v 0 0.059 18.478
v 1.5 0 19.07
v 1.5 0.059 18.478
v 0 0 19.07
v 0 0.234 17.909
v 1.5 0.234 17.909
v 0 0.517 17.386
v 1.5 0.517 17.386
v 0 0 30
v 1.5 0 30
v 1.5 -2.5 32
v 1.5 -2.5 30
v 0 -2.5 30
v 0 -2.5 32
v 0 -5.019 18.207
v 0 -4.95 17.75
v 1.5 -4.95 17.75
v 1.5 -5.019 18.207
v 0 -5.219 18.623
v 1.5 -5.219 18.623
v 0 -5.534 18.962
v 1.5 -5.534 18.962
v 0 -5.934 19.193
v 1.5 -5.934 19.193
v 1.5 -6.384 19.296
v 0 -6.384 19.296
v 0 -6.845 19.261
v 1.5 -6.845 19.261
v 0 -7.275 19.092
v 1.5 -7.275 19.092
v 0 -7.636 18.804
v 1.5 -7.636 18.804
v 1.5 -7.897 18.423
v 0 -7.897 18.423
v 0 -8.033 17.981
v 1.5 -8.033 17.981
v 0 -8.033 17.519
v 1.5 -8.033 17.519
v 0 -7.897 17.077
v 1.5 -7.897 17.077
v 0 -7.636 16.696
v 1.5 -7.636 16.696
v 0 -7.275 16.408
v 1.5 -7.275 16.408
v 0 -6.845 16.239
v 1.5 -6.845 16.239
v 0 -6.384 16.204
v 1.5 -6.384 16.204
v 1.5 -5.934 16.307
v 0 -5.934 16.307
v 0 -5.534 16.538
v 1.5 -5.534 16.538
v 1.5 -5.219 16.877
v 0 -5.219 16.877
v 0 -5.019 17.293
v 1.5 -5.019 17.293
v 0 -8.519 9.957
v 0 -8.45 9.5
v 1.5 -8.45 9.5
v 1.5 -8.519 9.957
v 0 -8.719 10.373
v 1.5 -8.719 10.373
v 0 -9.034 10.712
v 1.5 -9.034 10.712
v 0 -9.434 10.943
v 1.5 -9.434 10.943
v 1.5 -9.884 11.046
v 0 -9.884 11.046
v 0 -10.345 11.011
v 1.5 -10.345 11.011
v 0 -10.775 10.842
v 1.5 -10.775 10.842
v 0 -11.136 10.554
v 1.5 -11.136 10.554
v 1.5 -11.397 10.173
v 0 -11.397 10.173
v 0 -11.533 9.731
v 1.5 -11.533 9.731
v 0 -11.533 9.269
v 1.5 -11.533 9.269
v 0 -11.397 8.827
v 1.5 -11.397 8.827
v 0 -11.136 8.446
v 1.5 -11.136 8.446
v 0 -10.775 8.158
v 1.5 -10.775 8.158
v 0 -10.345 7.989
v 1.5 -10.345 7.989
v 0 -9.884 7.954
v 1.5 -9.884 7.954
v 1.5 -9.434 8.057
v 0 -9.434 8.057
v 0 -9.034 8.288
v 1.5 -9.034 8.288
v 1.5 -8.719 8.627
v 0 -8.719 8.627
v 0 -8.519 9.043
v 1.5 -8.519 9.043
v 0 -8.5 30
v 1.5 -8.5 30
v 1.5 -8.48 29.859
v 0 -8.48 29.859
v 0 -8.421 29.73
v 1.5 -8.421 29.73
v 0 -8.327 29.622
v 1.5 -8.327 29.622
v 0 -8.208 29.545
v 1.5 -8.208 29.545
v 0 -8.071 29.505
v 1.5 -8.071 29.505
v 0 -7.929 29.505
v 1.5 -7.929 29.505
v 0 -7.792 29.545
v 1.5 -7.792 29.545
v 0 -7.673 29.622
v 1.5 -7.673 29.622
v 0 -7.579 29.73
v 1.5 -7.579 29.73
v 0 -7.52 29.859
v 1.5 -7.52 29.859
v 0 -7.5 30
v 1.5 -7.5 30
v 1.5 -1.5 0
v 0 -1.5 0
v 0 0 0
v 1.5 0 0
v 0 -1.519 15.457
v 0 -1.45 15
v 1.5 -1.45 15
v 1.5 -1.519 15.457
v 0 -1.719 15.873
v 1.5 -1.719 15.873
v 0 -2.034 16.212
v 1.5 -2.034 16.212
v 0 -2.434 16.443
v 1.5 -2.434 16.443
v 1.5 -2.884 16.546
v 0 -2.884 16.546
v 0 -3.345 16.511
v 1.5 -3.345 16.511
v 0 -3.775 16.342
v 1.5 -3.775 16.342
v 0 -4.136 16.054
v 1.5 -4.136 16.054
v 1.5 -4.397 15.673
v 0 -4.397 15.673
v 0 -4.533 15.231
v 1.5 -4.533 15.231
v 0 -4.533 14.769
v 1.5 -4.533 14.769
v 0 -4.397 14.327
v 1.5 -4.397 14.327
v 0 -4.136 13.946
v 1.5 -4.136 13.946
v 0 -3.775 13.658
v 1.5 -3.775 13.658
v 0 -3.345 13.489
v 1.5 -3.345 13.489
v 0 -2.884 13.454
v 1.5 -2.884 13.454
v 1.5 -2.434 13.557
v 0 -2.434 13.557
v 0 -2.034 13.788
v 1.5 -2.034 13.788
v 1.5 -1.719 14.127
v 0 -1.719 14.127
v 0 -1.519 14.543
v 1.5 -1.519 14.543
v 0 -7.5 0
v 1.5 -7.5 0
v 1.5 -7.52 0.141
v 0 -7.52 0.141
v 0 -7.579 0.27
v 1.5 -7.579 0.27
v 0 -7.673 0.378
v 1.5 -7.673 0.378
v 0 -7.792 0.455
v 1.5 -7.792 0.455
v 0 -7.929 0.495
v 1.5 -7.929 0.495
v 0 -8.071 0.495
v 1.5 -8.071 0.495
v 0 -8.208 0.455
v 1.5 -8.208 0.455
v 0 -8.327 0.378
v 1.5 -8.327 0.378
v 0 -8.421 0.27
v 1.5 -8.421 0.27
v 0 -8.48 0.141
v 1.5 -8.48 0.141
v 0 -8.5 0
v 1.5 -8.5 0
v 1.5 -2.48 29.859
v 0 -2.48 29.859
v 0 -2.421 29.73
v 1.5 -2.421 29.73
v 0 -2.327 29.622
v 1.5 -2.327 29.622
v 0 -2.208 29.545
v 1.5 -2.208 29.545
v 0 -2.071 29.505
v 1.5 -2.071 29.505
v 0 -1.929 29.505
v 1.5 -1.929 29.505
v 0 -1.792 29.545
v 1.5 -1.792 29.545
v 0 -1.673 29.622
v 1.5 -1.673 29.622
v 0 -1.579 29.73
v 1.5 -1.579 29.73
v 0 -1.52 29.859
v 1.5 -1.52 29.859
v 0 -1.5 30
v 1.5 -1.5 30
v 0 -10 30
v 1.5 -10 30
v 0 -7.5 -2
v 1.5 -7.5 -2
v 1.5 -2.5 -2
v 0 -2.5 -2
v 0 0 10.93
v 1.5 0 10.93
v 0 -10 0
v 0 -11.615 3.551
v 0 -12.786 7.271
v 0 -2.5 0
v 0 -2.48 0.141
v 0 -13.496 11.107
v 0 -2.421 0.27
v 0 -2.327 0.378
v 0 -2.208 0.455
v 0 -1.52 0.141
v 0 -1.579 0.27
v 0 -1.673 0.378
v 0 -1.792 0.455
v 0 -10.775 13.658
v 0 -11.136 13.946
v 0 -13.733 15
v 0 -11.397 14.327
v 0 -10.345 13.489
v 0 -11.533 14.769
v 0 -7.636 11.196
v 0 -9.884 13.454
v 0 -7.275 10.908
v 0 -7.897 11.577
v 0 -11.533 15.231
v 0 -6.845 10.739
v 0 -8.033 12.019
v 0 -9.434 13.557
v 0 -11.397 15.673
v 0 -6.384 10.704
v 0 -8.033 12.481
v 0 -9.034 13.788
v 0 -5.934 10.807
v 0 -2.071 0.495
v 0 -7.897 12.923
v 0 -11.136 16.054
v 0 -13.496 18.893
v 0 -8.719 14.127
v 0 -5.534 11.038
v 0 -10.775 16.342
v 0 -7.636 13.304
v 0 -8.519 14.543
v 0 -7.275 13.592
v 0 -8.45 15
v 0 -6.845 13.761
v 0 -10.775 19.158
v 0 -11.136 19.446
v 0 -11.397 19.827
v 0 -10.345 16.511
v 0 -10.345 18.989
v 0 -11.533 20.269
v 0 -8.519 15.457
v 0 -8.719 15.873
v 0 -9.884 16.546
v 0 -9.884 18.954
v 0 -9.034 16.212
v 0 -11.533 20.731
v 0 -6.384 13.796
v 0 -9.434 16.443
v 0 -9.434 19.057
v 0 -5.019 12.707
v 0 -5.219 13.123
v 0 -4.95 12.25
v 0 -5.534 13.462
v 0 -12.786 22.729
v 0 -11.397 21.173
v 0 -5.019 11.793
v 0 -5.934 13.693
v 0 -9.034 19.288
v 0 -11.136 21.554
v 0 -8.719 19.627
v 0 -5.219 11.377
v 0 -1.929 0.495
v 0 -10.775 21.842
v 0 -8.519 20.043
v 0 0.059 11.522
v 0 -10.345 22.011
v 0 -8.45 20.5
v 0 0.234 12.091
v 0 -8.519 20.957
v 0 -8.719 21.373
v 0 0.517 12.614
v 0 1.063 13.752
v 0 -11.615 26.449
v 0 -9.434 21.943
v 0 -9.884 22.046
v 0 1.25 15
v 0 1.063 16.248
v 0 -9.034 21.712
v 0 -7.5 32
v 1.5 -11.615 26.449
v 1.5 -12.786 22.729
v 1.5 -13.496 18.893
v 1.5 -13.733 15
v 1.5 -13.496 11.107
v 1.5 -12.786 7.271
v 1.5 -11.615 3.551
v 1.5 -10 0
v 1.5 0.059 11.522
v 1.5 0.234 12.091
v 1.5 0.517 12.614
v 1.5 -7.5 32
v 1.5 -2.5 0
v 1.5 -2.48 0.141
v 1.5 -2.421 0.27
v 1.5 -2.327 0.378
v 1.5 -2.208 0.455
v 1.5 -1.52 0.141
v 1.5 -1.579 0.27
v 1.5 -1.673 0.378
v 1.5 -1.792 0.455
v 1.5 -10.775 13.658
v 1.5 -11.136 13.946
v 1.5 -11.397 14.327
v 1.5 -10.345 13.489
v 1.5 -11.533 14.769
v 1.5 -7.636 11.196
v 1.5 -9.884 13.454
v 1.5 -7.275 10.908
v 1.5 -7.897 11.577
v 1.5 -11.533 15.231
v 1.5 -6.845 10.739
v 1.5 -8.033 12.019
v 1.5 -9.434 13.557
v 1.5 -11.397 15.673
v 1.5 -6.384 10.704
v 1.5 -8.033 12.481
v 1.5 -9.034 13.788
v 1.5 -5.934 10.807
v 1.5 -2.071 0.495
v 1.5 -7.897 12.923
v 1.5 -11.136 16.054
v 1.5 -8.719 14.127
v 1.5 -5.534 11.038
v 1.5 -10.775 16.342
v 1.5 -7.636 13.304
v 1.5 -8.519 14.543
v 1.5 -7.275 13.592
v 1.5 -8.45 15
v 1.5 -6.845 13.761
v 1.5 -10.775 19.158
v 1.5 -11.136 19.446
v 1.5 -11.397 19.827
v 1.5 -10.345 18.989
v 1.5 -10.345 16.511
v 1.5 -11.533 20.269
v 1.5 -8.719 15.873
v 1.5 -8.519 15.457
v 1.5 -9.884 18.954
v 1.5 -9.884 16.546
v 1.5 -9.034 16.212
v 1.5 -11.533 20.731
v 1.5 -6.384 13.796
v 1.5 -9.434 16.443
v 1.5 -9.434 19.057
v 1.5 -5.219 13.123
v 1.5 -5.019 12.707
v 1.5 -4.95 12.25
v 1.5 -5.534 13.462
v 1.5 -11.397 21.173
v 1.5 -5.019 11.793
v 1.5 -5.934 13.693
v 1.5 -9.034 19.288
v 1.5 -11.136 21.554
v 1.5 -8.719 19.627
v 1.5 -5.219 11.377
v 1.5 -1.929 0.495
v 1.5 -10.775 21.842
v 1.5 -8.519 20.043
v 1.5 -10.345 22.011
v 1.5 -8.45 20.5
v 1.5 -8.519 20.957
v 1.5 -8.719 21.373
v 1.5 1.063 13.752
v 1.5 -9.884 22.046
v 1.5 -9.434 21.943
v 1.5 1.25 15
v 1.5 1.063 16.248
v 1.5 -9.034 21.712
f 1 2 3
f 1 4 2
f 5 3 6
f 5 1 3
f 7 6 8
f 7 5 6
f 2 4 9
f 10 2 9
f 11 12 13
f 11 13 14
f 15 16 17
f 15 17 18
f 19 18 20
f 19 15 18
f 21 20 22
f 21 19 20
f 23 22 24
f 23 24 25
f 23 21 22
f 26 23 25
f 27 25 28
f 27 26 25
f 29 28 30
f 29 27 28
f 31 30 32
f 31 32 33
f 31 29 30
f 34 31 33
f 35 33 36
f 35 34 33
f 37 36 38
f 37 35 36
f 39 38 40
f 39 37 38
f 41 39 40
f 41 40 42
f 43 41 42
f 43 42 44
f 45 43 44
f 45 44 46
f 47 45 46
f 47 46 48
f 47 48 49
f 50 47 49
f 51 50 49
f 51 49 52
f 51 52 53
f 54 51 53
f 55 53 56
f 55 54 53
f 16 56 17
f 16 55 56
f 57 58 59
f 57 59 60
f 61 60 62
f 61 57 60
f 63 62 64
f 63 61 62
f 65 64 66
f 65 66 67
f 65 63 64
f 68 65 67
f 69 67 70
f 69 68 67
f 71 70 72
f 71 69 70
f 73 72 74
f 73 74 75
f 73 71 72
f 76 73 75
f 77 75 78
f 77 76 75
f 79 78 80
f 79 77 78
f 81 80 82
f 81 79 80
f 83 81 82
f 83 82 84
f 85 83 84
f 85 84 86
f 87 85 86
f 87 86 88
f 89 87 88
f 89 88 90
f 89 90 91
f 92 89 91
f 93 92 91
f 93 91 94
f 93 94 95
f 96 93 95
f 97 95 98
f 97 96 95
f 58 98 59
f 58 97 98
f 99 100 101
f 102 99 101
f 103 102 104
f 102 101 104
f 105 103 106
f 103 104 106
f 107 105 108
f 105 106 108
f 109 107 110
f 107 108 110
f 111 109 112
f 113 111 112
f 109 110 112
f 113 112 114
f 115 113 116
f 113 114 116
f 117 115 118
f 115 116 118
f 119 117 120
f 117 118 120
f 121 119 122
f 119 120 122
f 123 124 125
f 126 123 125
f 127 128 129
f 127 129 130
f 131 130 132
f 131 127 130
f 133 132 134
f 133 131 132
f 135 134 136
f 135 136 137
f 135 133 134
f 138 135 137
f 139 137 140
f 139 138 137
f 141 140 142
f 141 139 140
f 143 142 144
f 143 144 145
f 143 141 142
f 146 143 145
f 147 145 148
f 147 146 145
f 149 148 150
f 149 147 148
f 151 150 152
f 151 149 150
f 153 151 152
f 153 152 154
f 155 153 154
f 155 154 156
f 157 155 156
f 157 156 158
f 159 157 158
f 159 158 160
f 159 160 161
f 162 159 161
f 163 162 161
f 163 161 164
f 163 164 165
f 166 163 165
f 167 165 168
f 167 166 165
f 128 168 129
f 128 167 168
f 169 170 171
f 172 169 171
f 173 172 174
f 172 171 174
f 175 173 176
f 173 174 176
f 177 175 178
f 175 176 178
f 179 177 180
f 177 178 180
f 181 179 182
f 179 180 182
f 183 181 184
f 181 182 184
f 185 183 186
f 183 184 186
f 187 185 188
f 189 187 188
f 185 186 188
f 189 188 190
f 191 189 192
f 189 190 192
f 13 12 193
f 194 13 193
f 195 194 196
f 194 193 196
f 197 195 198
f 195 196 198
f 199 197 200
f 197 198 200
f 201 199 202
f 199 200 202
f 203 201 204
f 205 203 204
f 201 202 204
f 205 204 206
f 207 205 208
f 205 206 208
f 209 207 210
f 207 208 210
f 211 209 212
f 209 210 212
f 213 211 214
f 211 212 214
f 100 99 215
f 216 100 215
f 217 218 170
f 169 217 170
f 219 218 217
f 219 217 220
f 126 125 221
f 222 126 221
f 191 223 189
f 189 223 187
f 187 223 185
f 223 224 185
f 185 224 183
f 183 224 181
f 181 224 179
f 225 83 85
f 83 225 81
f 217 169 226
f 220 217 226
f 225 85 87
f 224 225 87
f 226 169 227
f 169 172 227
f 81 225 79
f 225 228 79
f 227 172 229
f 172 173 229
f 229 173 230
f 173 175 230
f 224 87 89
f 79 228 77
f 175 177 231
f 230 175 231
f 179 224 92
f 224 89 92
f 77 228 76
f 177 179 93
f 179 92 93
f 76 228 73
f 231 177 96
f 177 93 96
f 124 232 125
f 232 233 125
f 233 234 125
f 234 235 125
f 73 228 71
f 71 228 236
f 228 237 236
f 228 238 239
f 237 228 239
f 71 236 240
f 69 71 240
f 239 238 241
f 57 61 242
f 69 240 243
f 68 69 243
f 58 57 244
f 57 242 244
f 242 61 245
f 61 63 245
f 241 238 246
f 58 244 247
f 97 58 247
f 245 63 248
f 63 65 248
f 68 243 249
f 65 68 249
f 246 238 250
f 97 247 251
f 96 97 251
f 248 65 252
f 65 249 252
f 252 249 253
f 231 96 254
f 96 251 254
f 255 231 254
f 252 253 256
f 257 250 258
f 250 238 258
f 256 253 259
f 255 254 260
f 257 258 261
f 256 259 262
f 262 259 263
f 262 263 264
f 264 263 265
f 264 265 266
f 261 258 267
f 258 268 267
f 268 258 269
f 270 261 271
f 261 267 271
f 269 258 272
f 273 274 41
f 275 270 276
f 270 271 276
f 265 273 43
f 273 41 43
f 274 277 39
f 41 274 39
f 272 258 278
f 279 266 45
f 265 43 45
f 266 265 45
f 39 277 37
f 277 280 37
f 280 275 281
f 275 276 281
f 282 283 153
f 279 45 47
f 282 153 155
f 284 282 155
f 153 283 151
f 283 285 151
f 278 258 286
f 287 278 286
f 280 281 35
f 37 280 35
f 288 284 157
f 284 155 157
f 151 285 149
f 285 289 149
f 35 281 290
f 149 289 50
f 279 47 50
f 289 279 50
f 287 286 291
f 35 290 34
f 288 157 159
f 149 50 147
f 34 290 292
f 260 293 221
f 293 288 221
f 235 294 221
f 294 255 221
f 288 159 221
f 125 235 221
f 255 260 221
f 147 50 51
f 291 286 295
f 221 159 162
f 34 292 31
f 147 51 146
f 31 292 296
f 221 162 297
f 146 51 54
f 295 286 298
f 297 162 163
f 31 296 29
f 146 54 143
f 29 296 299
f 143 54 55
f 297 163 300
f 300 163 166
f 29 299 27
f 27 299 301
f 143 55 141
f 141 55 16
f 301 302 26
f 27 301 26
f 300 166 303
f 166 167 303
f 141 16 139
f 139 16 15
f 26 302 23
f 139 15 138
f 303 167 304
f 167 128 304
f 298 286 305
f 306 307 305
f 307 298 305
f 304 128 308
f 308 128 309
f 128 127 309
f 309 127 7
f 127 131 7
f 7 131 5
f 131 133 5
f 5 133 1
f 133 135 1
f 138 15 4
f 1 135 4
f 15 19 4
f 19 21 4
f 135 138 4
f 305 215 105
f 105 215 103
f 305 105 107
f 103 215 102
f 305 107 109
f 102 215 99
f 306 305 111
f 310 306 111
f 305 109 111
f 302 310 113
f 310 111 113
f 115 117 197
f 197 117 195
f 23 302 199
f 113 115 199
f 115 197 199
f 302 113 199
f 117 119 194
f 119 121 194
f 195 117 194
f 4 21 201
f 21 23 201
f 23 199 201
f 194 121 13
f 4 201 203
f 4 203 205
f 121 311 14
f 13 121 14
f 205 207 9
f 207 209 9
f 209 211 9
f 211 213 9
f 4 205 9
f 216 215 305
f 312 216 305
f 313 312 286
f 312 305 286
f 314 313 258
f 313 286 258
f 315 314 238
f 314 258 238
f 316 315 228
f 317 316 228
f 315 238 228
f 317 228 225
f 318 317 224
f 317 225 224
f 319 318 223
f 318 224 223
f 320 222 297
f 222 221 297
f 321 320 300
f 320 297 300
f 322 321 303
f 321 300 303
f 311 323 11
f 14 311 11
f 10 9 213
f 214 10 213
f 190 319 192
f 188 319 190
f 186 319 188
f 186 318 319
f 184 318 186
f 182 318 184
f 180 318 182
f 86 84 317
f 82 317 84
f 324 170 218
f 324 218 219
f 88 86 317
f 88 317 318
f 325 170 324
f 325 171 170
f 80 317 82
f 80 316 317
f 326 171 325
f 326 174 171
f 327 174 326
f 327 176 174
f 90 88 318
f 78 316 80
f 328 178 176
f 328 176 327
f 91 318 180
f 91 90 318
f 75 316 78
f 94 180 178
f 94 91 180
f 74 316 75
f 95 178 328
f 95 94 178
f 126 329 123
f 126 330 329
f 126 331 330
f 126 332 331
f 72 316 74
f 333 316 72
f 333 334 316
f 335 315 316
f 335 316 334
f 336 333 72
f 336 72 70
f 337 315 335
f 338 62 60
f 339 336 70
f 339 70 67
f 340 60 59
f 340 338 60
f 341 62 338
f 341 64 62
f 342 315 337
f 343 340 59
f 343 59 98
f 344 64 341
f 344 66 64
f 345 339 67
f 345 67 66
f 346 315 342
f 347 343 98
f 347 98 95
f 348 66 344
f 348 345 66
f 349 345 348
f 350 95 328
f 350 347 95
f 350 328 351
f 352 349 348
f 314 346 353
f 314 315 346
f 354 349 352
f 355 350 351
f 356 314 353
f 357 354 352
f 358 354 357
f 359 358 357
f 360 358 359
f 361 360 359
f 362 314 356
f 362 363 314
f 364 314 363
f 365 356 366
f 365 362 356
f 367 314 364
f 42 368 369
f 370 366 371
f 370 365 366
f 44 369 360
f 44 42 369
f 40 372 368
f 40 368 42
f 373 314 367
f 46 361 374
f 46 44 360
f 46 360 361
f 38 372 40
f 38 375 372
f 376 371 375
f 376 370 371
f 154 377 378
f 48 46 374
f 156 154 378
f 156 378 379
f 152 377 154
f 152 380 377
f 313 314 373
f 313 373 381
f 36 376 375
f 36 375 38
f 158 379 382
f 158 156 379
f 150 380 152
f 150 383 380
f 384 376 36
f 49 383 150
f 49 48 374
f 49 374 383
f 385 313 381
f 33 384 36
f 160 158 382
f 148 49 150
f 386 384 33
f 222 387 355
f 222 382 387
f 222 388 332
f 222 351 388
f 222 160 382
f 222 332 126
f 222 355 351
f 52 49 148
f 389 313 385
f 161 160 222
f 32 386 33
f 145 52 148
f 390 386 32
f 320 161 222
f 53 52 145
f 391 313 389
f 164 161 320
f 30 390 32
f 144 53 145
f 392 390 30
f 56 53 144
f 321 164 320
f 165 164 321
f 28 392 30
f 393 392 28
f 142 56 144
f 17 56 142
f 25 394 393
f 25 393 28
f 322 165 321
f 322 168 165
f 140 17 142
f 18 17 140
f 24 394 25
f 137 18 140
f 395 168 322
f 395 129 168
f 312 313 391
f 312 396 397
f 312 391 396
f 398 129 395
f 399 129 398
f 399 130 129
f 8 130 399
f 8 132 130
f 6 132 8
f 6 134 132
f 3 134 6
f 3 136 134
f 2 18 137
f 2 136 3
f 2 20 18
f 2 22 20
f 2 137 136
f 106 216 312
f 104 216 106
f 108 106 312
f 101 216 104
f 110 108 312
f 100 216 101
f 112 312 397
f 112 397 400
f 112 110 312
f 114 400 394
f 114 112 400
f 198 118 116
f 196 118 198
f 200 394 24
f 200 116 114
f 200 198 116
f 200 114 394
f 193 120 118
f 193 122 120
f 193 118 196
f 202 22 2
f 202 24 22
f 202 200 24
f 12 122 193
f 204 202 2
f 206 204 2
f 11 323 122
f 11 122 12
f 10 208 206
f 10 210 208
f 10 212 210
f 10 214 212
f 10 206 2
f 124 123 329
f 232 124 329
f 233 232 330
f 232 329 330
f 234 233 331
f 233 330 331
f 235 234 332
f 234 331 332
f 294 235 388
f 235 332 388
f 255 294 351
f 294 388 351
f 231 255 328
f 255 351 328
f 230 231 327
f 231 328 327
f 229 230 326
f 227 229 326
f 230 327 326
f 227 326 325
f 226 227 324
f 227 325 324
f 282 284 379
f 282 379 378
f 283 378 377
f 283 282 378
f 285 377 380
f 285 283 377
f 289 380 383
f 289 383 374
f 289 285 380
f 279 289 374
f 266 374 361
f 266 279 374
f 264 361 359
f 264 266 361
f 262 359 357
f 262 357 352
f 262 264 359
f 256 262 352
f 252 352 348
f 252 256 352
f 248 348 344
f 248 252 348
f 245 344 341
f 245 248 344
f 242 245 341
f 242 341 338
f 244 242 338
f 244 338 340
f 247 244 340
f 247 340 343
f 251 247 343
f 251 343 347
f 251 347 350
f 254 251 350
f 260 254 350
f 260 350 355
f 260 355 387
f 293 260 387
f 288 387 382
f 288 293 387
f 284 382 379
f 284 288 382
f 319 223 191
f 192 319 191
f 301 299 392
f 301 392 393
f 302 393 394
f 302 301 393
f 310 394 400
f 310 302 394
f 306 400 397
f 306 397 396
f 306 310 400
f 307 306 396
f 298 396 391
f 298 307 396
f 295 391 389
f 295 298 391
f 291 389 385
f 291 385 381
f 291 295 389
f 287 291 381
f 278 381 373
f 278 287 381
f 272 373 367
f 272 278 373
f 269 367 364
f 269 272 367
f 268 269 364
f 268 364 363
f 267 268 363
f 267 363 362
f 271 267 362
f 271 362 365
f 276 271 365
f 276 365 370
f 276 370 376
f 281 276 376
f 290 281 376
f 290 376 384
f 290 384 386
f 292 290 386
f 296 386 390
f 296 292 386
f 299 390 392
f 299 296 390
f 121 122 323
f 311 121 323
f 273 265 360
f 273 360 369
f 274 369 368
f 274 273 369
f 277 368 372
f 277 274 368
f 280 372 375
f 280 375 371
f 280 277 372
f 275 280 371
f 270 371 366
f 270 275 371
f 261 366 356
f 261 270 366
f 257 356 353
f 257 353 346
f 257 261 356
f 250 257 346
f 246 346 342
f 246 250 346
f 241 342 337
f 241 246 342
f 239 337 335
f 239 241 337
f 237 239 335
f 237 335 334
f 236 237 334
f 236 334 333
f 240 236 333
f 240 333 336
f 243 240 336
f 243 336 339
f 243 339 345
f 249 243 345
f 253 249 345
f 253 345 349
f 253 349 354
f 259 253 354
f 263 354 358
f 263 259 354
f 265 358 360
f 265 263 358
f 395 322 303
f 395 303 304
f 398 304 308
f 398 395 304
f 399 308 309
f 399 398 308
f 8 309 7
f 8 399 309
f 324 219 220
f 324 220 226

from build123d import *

# Parameters (mm, degrees)
F0_R     = 1.55
F1_DEPTH = 1.5
F2_W     = 5
F2_H     = 2
F3_DEPTH = 1.5
F4_R     = 0.5
F5_DEPTH = 25
F7_DEPTH = 1.5
F8_R     = 3


with BuildPart() as f1:
    # F0 (on Right) → F1 (new body)
    with BuildSketch(Plane.YZ):
        with BuildLine():
            Line((-10, 0), (0, 0))
            Line((0, 0), (0, 30))
            Line((0, 30), (-10, 30))
            ThreePointArc((-10, 30), (-13.7334119498, 15), (-10, 0))
        make_face()
        with Locations((-10, 9.5)):
            Circle(F0_R, mode=Mode.SUBTRACT)
        with Locations((-6.5, 12.25)):
            Circle(F0_R, mode=Mode.SUBTRACT)
        with Locations((-10, 15)):
            Circle(F0_R, mode=Mode.SUBTRACT)
        with Locations((-10, 20.5)):
            Circle(F0_R, mode=Mode.SUBTRACT)
        with Locations((-6.5, 17.75)):
            Circle(F0_R, mode=Mode.SUBTRACT)
        with Locations((-3, 15)):
            Circle(F0_R, mode=Mode.SUBTRACT)
    extrude(amount=F1_DEPTH)

    # F2 (on face) → F3 (join)
    with BuildSketch(Plane.YZ.offset(1.5)):
        with Locations((-5, 31)):
            Rectangle(F2_W, F2_H)
        with Locations((-5, -1)):
            Rectangle(F2_W, F2_H)
    extrude(amount=-F3_DEPTH)

    # F4 (on face) → F5 (cut)
    with BuildSketch(Plane.YZ.offset(1.5)):
        with Locations((-8, 30)):
            Circle(F4_R)
        with Locations((-2, 30)):
            Circle(F4_R)
        with Locations((-2, 0)):
            Circle(F4_R)
        with Locations((-8, 0)):
            Circle(F4_R)
    extrude(amount=-F5_DEPTH, mode=Mode.SUBTRACT)

    # F6 (on face) → F7 (join)
    with BuildSketch(Plane.YZ.offset(1.5)):
        with BuildLine():
            Line((0, 18.0103986447), (0, 11.9896013553))
            ThreePointArc((0, 11.9896013553), (1.25, 15), (0, 18.0103986447))
        make_face()
    extrude(amount=-F7_DEPTH)

    # F8
    f8_edges = [f1.edges().sort_by_distance(p)[0] for p in [
        (0.75, 0, 11.989601),
        (0.75, 0, 18.010399),
    ]]
    fillet(f8_edges, radius=F8_R)


solid = f1.part
